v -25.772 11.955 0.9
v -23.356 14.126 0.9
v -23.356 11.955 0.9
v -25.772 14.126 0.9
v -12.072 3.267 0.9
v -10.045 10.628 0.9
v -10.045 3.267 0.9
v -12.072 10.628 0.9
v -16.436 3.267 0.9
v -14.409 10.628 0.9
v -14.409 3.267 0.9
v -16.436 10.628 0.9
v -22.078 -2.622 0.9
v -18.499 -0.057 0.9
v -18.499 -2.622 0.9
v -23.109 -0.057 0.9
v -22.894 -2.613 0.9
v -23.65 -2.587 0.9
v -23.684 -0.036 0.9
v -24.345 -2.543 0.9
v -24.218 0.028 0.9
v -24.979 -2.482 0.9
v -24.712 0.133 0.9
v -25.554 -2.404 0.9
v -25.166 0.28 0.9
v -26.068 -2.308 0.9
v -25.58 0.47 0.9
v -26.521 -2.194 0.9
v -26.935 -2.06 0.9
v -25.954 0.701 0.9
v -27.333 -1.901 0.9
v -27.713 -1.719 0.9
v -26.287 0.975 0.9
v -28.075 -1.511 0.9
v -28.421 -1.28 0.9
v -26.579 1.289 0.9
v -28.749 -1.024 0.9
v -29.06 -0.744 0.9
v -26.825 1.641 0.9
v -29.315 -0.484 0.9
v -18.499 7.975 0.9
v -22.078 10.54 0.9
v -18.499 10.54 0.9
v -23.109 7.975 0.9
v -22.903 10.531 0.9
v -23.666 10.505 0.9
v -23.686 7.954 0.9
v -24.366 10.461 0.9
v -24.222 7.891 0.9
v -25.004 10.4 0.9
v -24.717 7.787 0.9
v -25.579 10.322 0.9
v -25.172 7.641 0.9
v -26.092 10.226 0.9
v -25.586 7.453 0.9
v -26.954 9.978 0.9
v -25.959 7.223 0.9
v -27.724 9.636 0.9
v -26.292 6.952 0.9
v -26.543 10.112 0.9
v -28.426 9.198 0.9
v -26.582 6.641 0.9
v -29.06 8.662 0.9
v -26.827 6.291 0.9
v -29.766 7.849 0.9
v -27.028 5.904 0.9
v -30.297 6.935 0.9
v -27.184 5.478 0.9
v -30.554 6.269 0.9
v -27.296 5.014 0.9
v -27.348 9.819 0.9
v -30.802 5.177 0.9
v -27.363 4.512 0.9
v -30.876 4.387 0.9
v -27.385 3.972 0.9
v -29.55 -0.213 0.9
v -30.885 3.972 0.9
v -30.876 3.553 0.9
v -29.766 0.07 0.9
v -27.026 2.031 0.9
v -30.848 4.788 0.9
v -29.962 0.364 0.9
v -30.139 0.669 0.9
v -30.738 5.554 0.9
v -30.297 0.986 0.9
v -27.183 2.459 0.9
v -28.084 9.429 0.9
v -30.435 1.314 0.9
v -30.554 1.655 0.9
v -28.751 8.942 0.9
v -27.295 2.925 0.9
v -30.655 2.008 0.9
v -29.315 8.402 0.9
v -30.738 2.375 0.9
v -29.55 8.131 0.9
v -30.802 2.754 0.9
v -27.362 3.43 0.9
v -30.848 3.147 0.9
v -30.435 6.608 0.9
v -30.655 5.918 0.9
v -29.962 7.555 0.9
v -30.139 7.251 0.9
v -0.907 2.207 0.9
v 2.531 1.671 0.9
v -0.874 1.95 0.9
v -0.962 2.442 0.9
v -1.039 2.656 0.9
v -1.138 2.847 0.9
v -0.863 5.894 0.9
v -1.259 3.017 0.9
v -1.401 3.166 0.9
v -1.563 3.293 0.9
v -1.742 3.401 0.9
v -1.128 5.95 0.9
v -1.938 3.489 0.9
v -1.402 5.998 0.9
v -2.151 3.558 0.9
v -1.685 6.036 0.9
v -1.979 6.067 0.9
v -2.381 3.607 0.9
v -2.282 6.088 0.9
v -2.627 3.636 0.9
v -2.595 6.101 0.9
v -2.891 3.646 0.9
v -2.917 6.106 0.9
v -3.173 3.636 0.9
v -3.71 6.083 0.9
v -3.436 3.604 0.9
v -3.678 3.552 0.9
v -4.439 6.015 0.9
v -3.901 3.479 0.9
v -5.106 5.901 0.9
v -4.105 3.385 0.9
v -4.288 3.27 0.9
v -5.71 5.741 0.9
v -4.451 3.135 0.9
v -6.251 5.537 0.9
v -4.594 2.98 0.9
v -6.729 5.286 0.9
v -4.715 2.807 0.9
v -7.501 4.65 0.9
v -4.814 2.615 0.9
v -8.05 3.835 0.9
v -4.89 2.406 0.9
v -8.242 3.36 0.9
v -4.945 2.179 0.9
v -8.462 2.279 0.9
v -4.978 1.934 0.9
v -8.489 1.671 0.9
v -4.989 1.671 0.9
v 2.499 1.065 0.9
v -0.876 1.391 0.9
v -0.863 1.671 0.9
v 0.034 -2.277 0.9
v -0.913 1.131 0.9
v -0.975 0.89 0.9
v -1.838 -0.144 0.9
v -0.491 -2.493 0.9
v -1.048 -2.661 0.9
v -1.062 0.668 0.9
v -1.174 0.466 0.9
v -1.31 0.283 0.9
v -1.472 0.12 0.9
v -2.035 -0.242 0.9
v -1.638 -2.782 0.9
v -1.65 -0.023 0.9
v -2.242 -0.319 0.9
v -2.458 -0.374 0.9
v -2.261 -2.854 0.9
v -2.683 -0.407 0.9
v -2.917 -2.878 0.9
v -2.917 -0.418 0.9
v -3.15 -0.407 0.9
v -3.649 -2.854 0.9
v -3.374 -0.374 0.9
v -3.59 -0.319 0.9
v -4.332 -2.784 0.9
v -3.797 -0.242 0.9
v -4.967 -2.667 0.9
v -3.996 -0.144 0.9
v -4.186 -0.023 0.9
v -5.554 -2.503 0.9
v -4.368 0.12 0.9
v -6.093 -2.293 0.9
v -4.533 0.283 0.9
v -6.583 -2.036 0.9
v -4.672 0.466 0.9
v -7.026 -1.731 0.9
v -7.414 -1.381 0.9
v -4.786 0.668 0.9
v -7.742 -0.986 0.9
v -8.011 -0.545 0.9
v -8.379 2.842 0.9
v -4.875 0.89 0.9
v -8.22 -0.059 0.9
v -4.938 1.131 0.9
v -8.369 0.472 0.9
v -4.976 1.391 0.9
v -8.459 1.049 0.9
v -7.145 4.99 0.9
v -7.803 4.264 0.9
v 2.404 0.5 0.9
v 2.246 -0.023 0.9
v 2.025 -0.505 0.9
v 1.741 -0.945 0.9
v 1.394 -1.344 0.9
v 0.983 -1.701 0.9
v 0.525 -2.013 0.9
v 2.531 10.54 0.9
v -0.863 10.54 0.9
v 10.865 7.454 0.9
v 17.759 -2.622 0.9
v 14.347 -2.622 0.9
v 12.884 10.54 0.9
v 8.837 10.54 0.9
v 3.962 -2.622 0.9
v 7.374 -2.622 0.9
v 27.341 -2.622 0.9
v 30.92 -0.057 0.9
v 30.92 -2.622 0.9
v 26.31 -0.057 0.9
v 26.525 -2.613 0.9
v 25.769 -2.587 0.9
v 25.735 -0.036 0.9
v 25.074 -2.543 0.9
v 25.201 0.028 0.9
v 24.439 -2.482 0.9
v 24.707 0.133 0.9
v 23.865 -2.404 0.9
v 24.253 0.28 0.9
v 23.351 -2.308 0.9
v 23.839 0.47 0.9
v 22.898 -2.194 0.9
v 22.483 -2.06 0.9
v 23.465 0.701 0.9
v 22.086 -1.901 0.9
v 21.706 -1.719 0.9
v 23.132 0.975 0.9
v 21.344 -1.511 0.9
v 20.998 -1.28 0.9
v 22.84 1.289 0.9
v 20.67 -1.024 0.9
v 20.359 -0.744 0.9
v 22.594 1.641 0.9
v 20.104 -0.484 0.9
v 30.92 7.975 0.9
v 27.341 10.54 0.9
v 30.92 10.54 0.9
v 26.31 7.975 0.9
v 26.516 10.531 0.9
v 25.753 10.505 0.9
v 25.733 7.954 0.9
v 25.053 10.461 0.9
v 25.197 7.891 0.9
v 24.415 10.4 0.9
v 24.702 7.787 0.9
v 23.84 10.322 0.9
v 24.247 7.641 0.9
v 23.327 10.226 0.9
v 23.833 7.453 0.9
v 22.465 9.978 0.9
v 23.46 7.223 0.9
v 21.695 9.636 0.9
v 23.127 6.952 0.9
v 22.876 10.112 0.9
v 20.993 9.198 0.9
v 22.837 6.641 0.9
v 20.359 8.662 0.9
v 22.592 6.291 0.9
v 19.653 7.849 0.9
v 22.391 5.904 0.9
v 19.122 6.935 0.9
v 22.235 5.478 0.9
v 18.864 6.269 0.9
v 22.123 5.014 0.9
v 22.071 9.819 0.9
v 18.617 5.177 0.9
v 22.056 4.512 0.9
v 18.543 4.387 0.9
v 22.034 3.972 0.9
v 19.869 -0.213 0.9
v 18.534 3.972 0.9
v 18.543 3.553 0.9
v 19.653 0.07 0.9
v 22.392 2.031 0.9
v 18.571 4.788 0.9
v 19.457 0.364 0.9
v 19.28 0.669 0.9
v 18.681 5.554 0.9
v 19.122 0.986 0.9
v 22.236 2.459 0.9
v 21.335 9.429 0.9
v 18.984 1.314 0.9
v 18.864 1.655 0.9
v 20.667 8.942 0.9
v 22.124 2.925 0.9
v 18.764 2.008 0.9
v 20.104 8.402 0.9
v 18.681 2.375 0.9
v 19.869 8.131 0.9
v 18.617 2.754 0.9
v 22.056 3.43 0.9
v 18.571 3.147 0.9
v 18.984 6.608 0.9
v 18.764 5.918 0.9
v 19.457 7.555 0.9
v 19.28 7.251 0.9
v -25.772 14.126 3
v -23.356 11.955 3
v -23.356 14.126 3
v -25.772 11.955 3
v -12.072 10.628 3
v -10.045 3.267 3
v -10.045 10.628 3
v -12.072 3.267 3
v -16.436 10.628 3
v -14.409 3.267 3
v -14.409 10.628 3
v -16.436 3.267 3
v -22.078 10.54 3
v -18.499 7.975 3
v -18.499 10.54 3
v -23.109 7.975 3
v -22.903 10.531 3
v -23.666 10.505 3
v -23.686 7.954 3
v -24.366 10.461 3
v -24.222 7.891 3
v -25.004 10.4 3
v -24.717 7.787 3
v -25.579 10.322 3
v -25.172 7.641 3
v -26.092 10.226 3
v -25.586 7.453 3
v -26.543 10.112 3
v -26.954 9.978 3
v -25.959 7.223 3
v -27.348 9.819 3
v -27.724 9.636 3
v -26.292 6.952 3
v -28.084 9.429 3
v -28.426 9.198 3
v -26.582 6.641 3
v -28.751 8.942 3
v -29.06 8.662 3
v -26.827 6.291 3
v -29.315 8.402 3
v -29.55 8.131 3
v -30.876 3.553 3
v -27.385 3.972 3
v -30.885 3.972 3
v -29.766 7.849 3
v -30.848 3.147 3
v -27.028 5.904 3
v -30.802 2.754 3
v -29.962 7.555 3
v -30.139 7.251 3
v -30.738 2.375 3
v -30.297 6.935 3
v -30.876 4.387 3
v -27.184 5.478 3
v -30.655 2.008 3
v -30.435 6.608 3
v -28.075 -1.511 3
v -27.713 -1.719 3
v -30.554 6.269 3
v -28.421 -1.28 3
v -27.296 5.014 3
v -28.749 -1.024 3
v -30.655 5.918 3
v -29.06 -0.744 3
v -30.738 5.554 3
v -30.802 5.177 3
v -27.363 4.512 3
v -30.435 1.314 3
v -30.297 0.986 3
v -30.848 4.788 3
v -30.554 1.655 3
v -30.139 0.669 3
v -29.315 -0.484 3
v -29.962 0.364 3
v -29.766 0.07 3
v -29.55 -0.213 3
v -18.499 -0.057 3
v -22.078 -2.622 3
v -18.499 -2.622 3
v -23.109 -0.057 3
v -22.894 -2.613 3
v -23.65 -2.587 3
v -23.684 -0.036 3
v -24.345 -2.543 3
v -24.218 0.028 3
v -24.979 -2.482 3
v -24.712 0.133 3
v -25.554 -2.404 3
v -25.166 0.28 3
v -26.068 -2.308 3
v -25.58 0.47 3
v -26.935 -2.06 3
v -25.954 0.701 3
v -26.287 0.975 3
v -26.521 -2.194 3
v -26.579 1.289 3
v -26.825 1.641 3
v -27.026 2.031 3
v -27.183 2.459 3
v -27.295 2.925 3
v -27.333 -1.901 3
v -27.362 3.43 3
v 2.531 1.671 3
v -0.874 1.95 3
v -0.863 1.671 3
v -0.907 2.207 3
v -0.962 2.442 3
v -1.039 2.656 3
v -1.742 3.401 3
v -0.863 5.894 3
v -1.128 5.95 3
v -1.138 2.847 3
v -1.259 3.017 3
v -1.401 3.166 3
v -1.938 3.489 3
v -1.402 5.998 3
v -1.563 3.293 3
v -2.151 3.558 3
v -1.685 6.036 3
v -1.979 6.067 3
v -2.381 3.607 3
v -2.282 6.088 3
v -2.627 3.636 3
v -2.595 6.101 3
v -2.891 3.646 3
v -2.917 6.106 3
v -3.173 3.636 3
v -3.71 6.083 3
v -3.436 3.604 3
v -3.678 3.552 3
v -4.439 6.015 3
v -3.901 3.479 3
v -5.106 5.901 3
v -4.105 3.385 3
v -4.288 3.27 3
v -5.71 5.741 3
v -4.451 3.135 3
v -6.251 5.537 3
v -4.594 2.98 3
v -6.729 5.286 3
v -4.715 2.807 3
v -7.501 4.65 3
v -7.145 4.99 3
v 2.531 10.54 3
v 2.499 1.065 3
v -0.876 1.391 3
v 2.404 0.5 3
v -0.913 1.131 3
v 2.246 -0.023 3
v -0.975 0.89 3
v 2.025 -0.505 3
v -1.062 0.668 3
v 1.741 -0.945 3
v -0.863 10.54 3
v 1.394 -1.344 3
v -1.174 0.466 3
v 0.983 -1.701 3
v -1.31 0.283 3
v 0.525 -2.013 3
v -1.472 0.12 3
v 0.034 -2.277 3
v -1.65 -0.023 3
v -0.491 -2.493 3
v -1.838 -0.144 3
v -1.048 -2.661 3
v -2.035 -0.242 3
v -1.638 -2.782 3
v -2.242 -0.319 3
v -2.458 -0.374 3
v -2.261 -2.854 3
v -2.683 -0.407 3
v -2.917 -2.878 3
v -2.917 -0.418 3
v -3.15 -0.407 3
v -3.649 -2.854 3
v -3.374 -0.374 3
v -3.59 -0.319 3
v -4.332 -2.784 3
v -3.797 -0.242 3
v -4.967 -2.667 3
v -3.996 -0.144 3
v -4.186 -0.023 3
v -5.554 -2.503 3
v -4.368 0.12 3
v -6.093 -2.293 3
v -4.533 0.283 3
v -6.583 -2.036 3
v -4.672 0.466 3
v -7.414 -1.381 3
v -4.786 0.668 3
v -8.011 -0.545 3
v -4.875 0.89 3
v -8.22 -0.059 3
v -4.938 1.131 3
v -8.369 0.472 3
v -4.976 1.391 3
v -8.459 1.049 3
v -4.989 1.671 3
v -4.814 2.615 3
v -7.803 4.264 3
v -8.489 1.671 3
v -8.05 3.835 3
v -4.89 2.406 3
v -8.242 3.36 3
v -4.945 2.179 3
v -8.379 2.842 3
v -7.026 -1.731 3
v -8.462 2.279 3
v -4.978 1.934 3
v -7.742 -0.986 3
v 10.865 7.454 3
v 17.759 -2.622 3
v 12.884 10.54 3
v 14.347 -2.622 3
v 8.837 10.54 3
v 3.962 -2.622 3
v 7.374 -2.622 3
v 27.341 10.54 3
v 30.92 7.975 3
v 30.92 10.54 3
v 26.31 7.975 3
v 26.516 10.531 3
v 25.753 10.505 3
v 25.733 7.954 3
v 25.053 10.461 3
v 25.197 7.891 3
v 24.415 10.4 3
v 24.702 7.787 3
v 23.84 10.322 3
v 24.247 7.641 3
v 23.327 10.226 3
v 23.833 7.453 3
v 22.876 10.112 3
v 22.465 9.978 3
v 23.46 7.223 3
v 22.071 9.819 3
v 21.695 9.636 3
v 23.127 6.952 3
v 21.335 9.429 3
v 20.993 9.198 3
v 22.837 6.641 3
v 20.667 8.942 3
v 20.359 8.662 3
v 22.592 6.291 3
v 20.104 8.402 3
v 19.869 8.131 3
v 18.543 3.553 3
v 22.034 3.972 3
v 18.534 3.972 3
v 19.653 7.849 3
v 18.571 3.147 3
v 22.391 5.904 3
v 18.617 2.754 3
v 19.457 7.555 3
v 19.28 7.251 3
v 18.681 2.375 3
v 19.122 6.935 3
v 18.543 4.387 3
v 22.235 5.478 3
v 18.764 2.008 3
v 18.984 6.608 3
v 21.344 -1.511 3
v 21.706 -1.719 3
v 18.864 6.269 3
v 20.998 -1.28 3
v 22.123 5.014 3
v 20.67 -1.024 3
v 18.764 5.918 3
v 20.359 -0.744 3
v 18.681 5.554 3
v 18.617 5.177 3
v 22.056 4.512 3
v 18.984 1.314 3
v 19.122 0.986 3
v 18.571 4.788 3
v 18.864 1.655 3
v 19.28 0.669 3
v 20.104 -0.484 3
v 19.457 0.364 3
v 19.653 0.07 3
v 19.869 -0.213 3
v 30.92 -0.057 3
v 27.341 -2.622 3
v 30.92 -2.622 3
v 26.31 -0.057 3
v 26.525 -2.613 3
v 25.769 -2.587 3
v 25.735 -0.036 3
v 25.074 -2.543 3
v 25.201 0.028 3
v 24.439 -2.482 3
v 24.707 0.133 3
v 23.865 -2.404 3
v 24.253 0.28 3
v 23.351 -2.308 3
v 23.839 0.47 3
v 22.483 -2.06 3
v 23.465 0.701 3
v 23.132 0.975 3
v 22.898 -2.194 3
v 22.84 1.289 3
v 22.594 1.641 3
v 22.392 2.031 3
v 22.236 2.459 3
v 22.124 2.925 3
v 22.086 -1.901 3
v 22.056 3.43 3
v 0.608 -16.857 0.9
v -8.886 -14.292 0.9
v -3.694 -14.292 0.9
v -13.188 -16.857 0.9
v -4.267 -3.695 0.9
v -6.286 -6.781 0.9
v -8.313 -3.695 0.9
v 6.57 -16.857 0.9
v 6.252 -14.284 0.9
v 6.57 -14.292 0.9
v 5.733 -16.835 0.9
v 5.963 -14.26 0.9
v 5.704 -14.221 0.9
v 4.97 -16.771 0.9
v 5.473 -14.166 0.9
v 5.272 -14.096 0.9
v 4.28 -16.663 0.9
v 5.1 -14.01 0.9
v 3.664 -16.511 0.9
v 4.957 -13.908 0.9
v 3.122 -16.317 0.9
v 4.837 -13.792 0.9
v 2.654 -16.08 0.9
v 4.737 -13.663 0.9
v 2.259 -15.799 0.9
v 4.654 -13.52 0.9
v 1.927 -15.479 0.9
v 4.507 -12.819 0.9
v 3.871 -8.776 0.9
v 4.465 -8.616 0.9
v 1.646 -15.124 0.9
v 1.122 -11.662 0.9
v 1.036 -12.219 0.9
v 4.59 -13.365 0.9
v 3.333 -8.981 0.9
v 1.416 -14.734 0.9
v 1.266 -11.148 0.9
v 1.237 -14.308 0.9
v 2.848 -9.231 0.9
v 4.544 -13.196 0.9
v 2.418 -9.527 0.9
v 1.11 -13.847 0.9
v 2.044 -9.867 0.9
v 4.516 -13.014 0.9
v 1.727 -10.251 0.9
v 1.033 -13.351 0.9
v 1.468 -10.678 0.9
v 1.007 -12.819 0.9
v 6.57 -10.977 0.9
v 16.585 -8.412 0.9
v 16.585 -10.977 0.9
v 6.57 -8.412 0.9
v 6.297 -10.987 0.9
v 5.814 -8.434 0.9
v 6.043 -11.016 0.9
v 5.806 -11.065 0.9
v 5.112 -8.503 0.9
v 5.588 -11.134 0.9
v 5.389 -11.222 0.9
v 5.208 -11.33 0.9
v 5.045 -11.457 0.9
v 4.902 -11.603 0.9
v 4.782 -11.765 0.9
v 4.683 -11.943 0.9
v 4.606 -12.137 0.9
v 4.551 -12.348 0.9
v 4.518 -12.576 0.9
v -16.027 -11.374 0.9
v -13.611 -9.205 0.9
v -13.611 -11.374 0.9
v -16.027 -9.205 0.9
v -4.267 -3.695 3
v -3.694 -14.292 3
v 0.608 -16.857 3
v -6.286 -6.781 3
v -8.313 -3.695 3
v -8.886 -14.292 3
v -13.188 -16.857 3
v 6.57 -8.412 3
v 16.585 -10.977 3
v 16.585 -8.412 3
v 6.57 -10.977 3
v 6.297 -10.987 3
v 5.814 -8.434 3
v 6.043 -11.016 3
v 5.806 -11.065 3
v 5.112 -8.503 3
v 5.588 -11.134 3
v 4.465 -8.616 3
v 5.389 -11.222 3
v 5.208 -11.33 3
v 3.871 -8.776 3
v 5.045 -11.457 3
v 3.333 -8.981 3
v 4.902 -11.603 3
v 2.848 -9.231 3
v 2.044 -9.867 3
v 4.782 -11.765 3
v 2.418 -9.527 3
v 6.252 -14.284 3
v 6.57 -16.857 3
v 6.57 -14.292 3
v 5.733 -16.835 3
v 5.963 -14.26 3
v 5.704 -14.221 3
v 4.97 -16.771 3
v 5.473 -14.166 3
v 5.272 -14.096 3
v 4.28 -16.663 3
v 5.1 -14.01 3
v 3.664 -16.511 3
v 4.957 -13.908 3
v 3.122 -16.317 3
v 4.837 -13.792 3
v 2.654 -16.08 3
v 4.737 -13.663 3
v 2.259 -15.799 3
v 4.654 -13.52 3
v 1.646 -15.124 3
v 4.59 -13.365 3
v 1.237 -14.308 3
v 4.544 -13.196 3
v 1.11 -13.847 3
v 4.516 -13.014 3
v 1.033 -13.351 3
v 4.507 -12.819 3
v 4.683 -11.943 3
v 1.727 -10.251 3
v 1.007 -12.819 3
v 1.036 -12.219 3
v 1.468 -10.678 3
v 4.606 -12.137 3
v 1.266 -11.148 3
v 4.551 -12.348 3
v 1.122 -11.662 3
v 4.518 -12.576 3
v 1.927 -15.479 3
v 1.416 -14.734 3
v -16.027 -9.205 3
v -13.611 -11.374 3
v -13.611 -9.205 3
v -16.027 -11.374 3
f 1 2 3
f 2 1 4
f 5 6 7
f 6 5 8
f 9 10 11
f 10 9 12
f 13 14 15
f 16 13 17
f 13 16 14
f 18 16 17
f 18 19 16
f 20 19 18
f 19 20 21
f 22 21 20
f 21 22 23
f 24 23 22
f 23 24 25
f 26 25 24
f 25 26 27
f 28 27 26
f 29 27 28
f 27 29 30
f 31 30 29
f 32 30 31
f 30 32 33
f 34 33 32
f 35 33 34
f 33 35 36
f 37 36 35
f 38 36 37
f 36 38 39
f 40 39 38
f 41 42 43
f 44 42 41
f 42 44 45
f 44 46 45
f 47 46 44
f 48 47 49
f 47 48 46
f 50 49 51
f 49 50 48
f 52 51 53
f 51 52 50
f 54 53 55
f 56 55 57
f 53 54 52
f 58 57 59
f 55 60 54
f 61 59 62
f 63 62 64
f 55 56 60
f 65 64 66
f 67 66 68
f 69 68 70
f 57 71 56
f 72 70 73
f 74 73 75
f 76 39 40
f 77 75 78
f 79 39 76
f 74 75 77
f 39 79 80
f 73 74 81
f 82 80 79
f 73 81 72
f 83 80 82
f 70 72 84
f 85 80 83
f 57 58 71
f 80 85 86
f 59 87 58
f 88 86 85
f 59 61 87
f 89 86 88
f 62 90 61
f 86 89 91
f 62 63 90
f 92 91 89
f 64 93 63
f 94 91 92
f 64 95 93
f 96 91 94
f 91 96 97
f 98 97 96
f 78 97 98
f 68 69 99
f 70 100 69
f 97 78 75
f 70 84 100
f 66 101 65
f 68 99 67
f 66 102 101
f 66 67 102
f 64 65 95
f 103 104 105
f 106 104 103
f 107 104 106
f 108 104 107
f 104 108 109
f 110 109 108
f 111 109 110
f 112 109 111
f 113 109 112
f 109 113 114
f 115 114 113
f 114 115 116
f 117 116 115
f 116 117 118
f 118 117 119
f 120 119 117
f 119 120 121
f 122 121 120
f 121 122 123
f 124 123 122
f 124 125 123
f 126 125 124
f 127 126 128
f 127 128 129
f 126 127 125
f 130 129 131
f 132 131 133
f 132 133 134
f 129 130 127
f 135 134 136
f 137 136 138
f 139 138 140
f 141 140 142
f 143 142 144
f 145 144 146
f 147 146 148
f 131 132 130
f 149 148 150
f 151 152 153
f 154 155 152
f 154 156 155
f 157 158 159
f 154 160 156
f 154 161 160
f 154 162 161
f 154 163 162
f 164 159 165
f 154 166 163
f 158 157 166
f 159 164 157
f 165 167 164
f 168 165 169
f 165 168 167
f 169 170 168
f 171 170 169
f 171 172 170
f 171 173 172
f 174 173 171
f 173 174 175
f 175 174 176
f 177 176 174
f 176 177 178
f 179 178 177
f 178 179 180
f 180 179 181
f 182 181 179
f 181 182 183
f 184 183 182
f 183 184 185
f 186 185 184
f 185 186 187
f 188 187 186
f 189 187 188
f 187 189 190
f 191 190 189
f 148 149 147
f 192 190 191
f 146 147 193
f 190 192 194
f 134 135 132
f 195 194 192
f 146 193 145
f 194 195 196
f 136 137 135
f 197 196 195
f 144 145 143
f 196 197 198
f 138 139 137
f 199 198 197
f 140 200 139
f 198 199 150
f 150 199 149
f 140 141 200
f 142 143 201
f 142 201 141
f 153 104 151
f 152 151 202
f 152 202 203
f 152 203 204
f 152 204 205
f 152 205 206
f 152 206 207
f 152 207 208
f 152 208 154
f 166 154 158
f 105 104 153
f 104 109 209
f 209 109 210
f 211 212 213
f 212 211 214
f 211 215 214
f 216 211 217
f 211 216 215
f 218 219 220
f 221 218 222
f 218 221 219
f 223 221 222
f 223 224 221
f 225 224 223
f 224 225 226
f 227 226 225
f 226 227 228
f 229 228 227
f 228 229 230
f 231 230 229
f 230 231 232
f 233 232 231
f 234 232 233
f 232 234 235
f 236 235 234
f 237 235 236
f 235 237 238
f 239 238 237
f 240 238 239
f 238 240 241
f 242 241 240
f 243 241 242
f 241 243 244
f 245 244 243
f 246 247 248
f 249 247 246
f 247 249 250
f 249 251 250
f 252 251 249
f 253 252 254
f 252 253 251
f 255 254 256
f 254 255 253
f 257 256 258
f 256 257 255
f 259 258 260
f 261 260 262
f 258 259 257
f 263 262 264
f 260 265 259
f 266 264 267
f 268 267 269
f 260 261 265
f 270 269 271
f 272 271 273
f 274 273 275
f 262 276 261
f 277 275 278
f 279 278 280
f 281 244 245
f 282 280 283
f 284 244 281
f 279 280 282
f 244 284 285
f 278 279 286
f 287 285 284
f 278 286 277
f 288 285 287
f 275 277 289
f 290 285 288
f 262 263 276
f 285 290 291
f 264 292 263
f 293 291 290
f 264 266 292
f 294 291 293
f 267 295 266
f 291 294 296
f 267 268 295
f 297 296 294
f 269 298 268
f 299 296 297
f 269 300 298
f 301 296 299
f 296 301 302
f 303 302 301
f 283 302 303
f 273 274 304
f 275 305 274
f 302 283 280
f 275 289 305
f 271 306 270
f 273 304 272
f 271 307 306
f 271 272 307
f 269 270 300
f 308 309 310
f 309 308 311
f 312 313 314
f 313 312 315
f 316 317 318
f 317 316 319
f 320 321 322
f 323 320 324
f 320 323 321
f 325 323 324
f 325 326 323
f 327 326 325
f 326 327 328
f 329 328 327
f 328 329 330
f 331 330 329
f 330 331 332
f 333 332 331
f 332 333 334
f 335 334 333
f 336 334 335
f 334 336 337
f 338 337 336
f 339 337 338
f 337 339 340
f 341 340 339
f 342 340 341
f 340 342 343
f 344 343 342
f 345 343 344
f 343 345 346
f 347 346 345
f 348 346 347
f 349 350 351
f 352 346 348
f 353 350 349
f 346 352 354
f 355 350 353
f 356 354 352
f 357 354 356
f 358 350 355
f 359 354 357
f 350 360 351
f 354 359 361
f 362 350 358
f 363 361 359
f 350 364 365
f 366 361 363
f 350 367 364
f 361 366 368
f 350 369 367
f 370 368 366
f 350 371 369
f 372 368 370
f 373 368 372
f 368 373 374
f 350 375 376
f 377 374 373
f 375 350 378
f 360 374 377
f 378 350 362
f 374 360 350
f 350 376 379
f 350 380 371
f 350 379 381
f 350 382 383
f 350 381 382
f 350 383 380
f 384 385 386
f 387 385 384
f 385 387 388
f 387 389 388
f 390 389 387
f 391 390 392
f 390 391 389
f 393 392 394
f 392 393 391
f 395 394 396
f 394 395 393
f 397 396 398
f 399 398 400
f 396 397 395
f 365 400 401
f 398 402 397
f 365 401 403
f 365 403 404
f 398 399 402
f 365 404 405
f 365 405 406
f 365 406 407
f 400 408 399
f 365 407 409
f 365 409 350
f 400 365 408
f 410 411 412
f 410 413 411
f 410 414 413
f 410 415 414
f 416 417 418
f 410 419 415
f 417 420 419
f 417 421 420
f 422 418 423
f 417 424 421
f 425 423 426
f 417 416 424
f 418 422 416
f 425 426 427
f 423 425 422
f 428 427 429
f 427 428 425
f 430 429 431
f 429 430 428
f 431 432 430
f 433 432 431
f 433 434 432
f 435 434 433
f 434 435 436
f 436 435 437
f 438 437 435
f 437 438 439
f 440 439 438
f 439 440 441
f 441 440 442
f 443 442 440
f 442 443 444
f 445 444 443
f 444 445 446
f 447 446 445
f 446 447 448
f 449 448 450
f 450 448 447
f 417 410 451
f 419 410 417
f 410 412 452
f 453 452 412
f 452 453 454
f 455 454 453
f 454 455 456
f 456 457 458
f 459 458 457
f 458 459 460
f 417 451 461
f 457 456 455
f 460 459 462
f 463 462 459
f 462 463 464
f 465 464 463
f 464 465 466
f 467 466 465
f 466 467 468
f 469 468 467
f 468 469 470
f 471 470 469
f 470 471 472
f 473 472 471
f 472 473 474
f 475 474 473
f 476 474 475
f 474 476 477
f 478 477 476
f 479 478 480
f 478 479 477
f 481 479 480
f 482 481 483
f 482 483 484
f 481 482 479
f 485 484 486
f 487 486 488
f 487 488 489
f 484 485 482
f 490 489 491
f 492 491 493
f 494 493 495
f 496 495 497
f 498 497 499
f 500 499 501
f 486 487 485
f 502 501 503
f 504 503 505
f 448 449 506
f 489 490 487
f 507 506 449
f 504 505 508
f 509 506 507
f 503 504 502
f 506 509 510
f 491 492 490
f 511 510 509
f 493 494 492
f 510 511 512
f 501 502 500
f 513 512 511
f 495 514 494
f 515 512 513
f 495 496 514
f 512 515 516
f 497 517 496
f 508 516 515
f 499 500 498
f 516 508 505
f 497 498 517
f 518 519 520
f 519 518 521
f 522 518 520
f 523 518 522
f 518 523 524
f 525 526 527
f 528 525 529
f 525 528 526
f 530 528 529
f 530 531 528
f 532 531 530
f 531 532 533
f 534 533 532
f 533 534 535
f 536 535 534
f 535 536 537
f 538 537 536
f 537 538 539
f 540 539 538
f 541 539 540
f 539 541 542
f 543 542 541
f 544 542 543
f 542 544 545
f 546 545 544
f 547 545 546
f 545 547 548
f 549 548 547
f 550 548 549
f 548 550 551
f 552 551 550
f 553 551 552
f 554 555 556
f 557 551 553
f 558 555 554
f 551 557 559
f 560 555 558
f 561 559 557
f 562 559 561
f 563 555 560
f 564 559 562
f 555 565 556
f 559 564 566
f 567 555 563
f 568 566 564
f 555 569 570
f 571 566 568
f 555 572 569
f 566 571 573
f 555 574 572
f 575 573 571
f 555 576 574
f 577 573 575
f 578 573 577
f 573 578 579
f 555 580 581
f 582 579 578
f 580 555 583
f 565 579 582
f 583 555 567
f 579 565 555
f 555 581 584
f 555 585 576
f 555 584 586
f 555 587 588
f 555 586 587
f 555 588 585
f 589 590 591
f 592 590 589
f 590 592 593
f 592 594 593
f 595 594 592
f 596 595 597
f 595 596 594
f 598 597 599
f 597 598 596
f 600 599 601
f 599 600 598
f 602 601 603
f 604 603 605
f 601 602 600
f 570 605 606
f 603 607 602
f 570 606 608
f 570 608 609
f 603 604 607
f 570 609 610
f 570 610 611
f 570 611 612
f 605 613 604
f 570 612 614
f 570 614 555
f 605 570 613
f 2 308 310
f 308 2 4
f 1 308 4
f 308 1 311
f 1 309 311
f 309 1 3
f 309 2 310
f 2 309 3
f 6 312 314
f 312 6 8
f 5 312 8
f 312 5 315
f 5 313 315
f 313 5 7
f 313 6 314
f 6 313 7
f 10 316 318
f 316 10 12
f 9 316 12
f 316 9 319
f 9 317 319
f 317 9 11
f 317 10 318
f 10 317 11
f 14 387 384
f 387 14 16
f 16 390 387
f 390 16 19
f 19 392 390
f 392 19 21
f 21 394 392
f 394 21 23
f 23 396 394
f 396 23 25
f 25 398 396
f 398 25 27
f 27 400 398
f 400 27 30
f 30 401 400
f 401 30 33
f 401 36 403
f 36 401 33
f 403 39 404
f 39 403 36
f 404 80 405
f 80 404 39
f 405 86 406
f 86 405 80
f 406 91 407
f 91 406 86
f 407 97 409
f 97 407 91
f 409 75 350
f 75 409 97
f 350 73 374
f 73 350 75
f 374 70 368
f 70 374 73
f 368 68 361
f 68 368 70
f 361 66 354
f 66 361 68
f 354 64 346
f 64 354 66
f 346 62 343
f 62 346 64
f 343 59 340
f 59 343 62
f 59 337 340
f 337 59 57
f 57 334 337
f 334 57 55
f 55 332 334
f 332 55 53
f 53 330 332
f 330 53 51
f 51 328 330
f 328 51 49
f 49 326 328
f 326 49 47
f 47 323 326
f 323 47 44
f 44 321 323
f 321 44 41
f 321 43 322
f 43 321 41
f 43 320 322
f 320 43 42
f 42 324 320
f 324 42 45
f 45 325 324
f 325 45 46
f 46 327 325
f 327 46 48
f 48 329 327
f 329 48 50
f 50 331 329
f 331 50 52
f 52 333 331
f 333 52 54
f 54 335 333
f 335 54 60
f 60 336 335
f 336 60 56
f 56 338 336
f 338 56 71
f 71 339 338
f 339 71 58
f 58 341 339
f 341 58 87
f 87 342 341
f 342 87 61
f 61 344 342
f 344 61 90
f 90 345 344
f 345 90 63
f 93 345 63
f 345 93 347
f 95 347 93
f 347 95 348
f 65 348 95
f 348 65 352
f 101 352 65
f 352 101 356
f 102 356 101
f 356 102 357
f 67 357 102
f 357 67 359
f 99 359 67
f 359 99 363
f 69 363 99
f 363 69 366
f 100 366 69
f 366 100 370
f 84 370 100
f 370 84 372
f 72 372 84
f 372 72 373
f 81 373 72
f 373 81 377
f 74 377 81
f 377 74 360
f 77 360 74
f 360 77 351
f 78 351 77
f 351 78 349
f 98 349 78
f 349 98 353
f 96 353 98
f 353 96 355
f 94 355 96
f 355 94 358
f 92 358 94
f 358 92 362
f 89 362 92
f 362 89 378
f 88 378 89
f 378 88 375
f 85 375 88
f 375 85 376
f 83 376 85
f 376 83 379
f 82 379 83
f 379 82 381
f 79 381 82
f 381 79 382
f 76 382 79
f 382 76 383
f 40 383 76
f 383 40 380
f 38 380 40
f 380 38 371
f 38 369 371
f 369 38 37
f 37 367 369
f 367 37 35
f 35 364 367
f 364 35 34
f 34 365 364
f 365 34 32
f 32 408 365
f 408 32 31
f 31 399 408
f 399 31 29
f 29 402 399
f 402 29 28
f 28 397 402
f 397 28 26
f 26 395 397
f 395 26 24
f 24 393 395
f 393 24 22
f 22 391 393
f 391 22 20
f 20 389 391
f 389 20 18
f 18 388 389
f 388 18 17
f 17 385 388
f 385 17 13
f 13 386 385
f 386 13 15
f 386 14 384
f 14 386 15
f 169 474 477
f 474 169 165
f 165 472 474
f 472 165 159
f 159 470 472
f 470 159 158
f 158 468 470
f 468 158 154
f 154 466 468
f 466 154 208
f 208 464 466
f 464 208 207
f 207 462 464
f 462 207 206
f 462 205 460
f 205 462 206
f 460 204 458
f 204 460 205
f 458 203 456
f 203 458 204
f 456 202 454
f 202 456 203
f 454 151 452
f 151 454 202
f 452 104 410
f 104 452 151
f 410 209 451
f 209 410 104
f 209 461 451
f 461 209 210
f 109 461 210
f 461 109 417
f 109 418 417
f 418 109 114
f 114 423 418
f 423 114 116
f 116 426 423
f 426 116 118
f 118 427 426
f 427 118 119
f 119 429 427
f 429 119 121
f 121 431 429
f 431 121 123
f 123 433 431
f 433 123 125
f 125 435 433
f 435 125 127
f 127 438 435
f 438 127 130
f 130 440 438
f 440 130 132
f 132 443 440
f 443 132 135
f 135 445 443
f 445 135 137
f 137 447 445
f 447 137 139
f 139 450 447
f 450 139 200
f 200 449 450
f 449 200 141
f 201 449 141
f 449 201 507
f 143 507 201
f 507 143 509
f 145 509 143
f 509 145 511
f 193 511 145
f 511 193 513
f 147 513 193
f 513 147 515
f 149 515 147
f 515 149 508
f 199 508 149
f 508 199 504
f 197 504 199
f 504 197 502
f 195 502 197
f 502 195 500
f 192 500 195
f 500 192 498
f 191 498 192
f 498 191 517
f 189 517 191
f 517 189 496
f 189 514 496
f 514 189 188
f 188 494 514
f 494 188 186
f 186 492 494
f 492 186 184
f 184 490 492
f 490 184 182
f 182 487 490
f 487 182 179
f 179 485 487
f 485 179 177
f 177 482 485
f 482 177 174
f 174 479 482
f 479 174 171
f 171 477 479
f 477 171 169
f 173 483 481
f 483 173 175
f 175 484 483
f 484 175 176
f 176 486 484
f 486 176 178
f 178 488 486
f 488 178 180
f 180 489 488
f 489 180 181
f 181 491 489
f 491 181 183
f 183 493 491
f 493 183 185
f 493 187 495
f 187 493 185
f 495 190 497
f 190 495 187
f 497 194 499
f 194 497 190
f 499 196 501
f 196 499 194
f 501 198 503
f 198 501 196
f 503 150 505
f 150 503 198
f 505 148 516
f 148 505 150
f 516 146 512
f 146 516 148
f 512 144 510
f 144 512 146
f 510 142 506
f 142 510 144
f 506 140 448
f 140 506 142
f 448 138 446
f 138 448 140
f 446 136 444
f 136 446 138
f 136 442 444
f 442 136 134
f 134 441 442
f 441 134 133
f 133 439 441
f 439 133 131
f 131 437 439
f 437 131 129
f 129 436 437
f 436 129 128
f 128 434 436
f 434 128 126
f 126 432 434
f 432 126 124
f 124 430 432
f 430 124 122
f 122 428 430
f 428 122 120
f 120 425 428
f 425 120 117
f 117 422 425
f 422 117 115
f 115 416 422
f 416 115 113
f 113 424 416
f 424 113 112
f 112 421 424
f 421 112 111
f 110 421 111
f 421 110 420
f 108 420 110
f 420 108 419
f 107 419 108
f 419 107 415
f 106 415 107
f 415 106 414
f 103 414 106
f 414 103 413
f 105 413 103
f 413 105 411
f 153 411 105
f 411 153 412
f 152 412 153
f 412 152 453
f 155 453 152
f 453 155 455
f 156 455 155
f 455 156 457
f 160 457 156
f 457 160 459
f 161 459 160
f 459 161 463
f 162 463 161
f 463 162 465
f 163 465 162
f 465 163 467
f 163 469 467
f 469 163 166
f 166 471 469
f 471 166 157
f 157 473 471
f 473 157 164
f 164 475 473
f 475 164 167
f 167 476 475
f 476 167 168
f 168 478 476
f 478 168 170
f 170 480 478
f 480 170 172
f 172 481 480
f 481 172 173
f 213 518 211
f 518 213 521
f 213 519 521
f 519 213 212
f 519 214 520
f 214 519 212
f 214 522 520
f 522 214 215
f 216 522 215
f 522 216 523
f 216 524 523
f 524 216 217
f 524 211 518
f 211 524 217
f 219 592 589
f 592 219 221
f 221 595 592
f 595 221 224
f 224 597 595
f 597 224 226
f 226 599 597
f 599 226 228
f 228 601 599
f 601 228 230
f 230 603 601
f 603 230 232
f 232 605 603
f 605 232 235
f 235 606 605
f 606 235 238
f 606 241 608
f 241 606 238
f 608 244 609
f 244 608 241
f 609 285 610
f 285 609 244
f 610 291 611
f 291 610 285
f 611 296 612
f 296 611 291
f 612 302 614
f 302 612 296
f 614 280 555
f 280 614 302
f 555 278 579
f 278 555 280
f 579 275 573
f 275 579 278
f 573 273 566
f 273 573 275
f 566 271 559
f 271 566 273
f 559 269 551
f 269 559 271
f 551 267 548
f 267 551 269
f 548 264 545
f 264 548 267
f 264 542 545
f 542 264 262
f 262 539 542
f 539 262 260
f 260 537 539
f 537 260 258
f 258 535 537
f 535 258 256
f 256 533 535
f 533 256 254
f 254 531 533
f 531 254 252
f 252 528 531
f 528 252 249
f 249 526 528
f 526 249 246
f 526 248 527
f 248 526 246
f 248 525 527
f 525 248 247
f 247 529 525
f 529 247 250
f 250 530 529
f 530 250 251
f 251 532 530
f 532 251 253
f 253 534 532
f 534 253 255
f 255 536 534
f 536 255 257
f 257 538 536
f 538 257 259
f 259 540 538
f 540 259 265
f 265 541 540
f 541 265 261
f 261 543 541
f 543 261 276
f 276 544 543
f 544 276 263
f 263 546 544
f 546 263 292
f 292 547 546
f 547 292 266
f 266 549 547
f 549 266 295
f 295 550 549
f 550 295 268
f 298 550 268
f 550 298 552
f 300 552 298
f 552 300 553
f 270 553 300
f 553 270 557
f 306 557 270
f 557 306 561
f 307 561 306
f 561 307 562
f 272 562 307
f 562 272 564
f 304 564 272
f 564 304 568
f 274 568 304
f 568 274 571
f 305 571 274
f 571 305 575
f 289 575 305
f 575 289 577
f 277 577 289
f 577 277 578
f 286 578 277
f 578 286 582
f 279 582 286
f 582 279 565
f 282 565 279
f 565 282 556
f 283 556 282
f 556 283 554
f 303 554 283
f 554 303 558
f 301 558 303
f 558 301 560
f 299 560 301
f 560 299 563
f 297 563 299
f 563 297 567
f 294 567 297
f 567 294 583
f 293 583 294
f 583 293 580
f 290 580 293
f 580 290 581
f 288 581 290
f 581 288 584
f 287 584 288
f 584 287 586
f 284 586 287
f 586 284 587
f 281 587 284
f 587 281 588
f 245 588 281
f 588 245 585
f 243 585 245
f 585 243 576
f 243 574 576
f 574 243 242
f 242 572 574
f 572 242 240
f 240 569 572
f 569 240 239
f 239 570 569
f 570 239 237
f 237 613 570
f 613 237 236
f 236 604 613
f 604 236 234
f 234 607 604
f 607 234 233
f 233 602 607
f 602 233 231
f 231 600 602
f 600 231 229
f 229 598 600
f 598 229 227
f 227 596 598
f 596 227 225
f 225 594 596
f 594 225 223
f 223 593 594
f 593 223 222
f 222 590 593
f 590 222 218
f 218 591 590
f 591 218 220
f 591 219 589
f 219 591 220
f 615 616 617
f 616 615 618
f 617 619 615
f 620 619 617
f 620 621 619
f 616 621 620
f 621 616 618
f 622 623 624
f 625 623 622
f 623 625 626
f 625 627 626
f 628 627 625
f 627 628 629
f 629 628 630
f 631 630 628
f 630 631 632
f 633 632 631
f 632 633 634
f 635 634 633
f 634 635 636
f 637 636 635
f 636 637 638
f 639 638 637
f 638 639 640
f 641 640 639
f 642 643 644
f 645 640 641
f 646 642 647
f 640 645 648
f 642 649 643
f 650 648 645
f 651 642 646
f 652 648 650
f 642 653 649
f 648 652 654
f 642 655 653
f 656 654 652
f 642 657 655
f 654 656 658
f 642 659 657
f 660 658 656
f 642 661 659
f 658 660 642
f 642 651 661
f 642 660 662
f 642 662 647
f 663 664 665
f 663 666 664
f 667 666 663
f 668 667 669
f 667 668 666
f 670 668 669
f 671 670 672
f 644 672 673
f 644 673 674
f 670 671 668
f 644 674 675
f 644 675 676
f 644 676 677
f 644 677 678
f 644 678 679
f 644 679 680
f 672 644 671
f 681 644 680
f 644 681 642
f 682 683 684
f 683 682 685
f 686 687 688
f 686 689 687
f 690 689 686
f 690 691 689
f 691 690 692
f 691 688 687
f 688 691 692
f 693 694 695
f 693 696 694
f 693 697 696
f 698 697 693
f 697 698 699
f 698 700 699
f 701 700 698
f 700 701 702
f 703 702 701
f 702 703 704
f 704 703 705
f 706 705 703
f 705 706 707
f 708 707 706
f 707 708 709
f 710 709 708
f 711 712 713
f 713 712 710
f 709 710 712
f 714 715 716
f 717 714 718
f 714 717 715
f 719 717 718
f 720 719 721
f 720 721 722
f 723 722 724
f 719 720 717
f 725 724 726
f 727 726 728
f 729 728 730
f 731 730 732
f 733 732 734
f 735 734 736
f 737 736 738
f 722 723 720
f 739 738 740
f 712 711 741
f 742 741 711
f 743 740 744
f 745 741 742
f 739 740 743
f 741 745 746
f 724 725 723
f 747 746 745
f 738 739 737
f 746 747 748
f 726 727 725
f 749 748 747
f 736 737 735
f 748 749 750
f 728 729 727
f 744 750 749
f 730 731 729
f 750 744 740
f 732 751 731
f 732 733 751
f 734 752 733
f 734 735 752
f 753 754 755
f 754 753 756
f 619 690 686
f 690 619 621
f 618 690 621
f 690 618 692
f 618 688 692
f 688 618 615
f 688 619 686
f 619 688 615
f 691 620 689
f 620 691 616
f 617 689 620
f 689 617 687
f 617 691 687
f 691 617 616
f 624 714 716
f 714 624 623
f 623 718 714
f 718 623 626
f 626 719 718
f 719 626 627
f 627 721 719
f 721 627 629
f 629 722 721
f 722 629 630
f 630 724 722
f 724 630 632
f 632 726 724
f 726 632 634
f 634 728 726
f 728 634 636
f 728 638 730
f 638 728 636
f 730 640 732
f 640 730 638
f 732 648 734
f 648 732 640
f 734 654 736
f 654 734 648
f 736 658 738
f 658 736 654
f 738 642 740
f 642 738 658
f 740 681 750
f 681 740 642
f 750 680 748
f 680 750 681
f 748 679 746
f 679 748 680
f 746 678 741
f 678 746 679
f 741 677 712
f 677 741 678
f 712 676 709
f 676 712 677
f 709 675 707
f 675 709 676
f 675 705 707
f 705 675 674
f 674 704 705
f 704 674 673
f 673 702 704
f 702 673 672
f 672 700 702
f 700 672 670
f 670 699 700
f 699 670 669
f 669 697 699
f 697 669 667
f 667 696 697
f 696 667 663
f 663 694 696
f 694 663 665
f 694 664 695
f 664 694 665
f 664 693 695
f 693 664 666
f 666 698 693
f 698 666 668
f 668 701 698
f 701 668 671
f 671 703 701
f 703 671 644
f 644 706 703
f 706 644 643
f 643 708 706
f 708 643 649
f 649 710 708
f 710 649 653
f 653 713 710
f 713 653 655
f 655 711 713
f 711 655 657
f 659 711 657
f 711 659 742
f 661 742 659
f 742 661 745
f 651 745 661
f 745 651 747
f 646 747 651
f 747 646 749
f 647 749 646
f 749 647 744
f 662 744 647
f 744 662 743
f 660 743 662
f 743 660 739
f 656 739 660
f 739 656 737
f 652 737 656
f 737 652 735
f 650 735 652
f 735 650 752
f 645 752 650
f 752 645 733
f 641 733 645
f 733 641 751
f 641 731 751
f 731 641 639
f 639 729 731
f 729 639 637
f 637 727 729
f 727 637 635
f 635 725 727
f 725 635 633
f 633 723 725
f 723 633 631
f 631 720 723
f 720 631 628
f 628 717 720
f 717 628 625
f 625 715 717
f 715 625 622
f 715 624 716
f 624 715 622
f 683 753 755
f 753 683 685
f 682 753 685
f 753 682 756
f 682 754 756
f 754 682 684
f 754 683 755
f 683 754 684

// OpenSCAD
$fn = 48;
  // syllabics (overlaid on icon, tallest)
  translate([0, 5.430, 0.900]) linear_extrude(height=2.100) text("ᑖᐦᑯᐱᑕ", size=13.000, halign="center", valign="center", font="Euphemia UCAS:style=Bold");
  translate([0, -10.430, 0.900]) linear_extrude(height=2.100) text("ᐎᓕ", size=13.000, halign="center", valign="center", font="Euphemia UCAS:style=Bold");
